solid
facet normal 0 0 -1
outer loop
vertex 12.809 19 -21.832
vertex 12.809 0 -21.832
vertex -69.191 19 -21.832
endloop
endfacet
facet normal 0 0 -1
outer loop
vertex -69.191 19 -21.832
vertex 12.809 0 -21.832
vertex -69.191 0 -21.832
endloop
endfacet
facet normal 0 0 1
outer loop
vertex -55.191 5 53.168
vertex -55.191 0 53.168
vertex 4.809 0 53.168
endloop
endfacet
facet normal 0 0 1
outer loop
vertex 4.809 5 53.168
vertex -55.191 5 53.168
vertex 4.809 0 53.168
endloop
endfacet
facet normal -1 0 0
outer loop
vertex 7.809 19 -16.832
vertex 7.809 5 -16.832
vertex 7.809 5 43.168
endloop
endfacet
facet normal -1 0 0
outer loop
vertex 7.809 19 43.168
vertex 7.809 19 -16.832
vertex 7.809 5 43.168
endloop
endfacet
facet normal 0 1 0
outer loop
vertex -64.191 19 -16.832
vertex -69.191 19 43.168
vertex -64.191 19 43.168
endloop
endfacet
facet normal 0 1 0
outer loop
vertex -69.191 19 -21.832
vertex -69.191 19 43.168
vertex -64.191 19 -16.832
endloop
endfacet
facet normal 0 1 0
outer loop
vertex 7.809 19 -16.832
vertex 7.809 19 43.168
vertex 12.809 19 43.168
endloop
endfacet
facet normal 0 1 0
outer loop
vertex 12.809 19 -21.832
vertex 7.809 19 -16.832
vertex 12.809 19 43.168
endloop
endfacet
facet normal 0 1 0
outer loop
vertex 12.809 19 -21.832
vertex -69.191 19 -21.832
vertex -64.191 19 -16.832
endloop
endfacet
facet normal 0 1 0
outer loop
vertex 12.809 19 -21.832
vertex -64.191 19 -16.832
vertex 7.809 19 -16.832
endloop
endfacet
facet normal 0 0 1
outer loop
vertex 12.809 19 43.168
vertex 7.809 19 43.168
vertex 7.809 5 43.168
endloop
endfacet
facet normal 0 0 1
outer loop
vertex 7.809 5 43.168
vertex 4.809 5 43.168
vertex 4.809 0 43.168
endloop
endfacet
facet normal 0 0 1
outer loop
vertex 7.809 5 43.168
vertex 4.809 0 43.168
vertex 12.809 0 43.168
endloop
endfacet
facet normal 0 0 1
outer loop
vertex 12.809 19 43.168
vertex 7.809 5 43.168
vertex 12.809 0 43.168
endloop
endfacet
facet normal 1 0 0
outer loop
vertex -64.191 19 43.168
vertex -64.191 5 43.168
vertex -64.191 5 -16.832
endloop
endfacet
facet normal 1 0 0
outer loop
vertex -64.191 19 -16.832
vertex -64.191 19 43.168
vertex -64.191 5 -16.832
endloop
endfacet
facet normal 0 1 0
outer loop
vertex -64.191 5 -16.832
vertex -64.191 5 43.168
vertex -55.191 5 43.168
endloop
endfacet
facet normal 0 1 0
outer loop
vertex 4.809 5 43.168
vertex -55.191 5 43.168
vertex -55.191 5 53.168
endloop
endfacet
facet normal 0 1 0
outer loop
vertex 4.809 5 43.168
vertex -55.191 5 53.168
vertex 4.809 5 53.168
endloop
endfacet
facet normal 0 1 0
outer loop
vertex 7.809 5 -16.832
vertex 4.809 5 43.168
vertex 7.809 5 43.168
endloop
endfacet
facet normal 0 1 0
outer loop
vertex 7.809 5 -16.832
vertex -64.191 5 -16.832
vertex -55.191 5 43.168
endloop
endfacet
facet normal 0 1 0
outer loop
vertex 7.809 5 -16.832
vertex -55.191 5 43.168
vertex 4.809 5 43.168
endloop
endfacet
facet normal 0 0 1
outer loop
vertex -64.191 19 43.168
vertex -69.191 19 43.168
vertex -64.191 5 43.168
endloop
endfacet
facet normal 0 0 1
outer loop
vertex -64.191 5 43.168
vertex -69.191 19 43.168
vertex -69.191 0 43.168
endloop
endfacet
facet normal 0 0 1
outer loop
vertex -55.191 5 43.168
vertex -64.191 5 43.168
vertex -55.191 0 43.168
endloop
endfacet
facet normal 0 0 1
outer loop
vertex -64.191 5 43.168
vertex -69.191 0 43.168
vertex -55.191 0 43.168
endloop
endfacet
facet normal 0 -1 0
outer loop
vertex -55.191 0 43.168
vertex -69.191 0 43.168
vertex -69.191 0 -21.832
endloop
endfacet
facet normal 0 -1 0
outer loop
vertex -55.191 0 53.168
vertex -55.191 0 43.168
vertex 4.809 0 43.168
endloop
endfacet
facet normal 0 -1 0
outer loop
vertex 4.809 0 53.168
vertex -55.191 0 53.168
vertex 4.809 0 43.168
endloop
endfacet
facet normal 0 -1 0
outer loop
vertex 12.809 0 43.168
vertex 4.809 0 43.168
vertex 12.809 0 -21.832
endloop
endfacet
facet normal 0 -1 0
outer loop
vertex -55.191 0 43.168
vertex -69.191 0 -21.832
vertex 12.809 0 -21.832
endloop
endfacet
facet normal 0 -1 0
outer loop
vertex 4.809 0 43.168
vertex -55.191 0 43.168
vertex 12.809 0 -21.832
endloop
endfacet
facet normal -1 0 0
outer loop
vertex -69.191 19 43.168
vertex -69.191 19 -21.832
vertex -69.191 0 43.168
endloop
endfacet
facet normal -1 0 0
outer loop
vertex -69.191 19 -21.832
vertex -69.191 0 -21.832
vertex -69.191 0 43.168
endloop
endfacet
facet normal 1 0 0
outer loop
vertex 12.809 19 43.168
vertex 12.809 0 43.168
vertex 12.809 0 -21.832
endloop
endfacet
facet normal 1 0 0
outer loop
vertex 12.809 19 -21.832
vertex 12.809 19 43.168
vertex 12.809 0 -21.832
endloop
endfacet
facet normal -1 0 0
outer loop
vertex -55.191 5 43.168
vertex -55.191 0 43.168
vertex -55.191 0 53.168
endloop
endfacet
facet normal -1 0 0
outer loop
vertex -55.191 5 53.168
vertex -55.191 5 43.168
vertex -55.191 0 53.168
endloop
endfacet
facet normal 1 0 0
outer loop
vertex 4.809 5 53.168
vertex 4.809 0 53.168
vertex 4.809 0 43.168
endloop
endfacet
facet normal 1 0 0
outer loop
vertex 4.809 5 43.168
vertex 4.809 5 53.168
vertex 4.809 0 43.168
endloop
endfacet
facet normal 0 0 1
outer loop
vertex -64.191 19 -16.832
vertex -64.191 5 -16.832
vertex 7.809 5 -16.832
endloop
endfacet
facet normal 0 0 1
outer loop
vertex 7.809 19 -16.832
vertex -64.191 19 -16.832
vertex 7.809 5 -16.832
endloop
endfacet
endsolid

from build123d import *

# Parameters (mm, degrees)
EXTRUSION1_DEPTH = 5
EXTRUSION2_DEPTH = 14


with BuildPart() as part:
    # Esquisse1 → Extrusion1 (new body)
    with BuildSketch(Plane(origin=(0, 0, 0), x_dir=(1, 0, 0), z_dir=(0, 1, 0))):
        Polygon((-69.191486621, -43.16817348), (-55.191486621, -43.16817348), (-55.191486621, -53.16817348), (4.808513379, -53.16817348), (4.808513379, -43.16817348), (12.808513379, -43.16817348), (12.808513379, 21.83182652), (-69.191486621, 21.83182652), align=None)
    extrude(amount=EXTRUSION1_DEPTH)

    # Esquisse2 → Extrusion2 (add)
    with BuildSketch(Plane(origin=(0, 5, 0), x_dir=(1, 0, 0), z_dir=(0, 1, 0))):
        Polygon((12.808513379, -43.16817348), (12.808513379, 21.83182652), (-69.191486621, 21.83182652), (-69.191486621, -43.16817348), (-64.191486621, -43.16817348), (-64.191486621, 16.83182652), (7.808513379, 16.83182652), (7.808513379, -43.16817348), align=None)
    extrude(amount=EXTRUSION2_DEPTH)


solid = part.part
